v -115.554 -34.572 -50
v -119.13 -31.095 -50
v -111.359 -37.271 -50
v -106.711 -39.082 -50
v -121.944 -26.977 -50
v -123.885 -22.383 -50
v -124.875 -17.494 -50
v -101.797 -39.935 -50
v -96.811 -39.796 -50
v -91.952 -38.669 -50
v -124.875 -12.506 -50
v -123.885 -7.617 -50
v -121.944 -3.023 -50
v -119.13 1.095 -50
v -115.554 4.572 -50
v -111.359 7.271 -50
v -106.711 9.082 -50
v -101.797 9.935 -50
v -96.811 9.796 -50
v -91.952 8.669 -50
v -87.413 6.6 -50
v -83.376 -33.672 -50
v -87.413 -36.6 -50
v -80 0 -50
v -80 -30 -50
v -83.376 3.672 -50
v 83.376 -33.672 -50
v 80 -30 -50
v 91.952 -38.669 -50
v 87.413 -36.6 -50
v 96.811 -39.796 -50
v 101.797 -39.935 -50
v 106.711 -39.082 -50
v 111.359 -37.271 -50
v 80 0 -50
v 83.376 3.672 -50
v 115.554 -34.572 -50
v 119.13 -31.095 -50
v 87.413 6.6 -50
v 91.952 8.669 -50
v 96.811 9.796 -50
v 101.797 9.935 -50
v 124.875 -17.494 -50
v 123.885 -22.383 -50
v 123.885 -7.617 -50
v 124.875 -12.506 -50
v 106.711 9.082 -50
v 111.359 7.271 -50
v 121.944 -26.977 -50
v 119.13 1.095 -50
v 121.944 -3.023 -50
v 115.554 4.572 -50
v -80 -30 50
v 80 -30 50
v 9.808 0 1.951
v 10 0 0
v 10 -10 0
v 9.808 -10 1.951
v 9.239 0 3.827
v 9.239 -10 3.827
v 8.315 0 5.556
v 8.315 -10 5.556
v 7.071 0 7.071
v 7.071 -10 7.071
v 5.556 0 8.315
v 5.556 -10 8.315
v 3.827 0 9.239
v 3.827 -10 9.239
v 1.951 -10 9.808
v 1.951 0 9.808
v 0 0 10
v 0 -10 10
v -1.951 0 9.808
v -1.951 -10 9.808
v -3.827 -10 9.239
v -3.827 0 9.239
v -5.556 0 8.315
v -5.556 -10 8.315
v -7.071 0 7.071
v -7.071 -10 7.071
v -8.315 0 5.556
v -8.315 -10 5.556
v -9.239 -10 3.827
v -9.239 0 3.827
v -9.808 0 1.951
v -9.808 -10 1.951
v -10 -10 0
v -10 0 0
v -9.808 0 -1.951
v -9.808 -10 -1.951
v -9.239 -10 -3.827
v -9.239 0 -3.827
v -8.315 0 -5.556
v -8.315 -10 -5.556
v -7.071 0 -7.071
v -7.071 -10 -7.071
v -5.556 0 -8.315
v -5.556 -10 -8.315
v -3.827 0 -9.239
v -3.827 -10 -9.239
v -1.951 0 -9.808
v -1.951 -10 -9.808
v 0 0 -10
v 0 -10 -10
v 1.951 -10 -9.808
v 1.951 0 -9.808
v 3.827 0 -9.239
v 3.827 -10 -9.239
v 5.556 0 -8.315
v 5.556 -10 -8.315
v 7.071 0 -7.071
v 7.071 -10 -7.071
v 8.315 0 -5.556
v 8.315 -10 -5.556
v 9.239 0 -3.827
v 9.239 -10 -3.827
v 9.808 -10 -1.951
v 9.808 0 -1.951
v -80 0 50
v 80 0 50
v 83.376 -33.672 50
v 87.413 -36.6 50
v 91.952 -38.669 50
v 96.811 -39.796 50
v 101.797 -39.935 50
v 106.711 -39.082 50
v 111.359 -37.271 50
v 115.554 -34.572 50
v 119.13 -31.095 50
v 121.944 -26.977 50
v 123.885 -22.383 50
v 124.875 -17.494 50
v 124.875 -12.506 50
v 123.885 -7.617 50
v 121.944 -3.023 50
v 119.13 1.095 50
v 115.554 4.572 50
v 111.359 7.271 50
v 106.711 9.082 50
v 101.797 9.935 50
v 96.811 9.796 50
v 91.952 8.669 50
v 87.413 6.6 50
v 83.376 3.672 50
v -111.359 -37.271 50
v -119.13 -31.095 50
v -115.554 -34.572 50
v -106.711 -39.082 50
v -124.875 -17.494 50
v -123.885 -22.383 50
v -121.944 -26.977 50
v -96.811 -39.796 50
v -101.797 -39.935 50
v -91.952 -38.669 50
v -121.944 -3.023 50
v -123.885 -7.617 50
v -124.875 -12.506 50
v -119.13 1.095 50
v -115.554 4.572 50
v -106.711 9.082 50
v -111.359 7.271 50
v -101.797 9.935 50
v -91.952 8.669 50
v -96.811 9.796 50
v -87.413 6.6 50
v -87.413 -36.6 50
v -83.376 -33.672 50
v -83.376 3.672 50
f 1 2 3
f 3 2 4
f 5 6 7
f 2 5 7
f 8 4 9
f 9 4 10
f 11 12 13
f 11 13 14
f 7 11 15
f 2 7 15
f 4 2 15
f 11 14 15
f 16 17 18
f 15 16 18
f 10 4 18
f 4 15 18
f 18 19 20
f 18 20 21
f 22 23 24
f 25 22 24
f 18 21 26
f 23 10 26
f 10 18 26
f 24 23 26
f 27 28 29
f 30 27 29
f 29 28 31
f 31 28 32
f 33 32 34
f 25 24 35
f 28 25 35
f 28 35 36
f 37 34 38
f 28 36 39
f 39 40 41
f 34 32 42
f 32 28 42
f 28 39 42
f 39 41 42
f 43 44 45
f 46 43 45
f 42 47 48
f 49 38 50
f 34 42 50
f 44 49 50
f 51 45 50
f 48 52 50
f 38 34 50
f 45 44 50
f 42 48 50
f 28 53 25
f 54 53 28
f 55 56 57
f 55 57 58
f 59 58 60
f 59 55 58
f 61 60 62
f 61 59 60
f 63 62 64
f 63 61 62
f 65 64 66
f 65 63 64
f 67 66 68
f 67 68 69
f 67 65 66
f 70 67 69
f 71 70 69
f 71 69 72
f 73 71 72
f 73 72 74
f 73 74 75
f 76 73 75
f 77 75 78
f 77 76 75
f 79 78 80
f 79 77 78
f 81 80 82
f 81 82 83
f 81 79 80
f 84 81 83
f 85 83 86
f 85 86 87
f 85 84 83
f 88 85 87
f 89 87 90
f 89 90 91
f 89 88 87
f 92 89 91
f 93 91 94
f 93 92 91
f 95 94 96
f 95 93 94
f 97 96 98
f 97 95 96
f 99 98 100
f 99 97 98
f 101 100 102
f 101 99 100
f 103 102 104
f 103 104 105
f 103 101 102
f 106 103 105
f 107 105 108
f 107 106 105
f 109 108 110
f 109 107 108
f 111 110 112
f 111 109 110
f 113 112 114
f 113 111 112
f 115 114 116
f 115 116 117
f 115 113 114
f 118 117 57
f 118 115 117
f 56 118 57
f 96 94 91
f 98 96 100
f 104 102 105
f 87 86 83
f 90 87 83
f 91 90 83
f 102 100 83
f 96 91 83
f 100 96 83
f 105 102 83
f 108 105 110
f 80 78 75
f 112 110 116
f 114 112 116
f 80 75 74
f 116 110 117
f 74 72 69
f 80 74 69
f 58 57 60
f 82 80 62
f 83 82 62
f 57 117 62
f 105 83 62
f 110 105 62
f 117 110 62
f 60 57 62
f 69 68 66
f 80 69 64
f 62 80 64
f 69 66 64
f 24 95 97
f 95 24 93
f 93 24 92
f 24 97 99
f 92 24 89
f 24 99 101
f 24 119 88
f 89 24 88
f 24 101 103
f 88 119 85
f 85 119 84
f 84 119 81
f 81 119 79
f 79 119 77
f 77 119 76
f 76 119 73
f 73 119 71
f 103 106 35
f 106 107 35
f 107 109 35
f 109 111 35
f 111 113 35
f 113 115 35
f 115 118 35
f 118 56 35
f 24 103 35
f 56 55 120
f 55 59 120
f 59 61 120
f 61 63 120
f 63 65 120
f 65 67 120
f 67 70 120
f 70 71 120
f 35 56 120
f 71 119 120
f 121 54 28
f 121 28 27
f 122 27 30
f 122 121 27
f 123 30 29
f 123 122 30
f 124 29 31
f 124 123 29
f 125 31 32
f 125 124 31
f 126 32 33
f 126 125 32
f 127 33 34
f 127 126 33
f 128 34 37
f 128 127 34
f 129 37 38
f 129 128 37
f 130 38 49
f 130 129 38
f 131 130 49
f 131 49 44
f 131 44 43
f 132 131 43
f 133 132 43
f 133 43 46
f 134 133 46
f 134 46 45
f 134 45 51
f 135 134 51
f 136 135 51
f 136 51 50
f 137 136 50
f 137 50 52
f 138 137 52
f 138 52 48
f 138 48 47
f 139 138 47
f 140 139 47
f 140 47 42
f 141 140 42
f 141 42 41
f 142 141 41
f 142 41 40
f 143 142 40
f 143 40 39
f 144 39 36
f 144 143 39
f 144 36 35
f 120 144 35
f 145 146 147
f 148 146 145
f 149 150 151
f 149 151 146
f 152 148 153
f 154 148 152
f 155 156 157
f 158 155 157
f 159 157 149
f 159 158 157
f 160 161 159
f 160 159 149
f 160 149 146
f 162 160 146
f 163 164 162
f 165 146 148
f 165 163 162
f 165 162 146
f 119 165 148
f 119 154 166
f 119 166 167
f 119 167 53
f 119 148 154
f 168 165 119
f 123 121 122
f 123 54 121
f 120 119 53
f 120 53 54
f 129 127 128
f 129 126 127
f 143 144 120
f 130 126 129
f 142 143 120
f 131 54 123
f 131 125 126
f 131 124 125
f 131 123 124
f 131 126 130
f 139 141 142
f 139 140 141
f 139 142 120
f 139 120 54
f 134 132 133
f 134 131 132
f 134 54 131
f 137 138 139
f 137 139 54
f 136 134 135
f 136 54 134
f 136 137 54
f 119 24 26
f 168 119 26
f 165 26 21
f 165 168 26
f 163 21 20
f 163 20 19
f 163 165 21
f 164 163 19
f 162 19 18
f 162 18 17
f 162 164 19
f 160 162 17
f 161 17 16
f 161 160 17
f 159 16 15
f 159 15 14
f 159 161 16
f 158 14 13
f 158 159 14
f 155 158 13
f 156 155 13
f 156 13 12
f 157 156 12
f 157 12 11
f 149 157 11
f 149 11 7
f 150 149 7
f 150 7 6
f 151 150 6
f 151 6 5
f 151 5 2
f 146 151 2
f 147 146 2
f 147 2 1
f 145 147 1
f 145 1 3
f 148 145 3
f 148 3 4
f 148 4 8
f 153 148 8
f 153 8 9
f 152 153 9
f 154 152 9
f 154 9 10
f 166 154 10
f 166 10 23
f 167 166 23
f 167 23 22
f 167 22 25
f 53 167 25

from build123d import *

# Parameters (mm, degrees)
F0_W     = 200
F0_H     = 100
F1_DEPTH = 30
F2_R     = 25
F3_DEPTH = 50
F4_R     = 10
F5_DEPTH = 10


with BuildPart() as f1:
    # F0 (on Front) → F1 (new body)
    with BuildSketch(Plane.XZ):
        Rectangle(F0_W, F0_H)
    extrude(amount=F1_DEPTH)

    # F2 (on Top) → F3 (join, symmetric)
    with BuildSketch(Plane.XY):
        with Locations((-100, -15)):
            Circle(F2_R)
        with Locations((100, -15)):
            Circle(F2_R)
    extrude(amount=F3_DEPTH, both=True)

    # F4 (on Front) → F5 (cut)
    with BuildSketch(Plane.XZ):
        Circle(F4_R)
    extrude(amount=F5_DEPTH, mode=Mode.SUBTRACT)


solid = f1.part
